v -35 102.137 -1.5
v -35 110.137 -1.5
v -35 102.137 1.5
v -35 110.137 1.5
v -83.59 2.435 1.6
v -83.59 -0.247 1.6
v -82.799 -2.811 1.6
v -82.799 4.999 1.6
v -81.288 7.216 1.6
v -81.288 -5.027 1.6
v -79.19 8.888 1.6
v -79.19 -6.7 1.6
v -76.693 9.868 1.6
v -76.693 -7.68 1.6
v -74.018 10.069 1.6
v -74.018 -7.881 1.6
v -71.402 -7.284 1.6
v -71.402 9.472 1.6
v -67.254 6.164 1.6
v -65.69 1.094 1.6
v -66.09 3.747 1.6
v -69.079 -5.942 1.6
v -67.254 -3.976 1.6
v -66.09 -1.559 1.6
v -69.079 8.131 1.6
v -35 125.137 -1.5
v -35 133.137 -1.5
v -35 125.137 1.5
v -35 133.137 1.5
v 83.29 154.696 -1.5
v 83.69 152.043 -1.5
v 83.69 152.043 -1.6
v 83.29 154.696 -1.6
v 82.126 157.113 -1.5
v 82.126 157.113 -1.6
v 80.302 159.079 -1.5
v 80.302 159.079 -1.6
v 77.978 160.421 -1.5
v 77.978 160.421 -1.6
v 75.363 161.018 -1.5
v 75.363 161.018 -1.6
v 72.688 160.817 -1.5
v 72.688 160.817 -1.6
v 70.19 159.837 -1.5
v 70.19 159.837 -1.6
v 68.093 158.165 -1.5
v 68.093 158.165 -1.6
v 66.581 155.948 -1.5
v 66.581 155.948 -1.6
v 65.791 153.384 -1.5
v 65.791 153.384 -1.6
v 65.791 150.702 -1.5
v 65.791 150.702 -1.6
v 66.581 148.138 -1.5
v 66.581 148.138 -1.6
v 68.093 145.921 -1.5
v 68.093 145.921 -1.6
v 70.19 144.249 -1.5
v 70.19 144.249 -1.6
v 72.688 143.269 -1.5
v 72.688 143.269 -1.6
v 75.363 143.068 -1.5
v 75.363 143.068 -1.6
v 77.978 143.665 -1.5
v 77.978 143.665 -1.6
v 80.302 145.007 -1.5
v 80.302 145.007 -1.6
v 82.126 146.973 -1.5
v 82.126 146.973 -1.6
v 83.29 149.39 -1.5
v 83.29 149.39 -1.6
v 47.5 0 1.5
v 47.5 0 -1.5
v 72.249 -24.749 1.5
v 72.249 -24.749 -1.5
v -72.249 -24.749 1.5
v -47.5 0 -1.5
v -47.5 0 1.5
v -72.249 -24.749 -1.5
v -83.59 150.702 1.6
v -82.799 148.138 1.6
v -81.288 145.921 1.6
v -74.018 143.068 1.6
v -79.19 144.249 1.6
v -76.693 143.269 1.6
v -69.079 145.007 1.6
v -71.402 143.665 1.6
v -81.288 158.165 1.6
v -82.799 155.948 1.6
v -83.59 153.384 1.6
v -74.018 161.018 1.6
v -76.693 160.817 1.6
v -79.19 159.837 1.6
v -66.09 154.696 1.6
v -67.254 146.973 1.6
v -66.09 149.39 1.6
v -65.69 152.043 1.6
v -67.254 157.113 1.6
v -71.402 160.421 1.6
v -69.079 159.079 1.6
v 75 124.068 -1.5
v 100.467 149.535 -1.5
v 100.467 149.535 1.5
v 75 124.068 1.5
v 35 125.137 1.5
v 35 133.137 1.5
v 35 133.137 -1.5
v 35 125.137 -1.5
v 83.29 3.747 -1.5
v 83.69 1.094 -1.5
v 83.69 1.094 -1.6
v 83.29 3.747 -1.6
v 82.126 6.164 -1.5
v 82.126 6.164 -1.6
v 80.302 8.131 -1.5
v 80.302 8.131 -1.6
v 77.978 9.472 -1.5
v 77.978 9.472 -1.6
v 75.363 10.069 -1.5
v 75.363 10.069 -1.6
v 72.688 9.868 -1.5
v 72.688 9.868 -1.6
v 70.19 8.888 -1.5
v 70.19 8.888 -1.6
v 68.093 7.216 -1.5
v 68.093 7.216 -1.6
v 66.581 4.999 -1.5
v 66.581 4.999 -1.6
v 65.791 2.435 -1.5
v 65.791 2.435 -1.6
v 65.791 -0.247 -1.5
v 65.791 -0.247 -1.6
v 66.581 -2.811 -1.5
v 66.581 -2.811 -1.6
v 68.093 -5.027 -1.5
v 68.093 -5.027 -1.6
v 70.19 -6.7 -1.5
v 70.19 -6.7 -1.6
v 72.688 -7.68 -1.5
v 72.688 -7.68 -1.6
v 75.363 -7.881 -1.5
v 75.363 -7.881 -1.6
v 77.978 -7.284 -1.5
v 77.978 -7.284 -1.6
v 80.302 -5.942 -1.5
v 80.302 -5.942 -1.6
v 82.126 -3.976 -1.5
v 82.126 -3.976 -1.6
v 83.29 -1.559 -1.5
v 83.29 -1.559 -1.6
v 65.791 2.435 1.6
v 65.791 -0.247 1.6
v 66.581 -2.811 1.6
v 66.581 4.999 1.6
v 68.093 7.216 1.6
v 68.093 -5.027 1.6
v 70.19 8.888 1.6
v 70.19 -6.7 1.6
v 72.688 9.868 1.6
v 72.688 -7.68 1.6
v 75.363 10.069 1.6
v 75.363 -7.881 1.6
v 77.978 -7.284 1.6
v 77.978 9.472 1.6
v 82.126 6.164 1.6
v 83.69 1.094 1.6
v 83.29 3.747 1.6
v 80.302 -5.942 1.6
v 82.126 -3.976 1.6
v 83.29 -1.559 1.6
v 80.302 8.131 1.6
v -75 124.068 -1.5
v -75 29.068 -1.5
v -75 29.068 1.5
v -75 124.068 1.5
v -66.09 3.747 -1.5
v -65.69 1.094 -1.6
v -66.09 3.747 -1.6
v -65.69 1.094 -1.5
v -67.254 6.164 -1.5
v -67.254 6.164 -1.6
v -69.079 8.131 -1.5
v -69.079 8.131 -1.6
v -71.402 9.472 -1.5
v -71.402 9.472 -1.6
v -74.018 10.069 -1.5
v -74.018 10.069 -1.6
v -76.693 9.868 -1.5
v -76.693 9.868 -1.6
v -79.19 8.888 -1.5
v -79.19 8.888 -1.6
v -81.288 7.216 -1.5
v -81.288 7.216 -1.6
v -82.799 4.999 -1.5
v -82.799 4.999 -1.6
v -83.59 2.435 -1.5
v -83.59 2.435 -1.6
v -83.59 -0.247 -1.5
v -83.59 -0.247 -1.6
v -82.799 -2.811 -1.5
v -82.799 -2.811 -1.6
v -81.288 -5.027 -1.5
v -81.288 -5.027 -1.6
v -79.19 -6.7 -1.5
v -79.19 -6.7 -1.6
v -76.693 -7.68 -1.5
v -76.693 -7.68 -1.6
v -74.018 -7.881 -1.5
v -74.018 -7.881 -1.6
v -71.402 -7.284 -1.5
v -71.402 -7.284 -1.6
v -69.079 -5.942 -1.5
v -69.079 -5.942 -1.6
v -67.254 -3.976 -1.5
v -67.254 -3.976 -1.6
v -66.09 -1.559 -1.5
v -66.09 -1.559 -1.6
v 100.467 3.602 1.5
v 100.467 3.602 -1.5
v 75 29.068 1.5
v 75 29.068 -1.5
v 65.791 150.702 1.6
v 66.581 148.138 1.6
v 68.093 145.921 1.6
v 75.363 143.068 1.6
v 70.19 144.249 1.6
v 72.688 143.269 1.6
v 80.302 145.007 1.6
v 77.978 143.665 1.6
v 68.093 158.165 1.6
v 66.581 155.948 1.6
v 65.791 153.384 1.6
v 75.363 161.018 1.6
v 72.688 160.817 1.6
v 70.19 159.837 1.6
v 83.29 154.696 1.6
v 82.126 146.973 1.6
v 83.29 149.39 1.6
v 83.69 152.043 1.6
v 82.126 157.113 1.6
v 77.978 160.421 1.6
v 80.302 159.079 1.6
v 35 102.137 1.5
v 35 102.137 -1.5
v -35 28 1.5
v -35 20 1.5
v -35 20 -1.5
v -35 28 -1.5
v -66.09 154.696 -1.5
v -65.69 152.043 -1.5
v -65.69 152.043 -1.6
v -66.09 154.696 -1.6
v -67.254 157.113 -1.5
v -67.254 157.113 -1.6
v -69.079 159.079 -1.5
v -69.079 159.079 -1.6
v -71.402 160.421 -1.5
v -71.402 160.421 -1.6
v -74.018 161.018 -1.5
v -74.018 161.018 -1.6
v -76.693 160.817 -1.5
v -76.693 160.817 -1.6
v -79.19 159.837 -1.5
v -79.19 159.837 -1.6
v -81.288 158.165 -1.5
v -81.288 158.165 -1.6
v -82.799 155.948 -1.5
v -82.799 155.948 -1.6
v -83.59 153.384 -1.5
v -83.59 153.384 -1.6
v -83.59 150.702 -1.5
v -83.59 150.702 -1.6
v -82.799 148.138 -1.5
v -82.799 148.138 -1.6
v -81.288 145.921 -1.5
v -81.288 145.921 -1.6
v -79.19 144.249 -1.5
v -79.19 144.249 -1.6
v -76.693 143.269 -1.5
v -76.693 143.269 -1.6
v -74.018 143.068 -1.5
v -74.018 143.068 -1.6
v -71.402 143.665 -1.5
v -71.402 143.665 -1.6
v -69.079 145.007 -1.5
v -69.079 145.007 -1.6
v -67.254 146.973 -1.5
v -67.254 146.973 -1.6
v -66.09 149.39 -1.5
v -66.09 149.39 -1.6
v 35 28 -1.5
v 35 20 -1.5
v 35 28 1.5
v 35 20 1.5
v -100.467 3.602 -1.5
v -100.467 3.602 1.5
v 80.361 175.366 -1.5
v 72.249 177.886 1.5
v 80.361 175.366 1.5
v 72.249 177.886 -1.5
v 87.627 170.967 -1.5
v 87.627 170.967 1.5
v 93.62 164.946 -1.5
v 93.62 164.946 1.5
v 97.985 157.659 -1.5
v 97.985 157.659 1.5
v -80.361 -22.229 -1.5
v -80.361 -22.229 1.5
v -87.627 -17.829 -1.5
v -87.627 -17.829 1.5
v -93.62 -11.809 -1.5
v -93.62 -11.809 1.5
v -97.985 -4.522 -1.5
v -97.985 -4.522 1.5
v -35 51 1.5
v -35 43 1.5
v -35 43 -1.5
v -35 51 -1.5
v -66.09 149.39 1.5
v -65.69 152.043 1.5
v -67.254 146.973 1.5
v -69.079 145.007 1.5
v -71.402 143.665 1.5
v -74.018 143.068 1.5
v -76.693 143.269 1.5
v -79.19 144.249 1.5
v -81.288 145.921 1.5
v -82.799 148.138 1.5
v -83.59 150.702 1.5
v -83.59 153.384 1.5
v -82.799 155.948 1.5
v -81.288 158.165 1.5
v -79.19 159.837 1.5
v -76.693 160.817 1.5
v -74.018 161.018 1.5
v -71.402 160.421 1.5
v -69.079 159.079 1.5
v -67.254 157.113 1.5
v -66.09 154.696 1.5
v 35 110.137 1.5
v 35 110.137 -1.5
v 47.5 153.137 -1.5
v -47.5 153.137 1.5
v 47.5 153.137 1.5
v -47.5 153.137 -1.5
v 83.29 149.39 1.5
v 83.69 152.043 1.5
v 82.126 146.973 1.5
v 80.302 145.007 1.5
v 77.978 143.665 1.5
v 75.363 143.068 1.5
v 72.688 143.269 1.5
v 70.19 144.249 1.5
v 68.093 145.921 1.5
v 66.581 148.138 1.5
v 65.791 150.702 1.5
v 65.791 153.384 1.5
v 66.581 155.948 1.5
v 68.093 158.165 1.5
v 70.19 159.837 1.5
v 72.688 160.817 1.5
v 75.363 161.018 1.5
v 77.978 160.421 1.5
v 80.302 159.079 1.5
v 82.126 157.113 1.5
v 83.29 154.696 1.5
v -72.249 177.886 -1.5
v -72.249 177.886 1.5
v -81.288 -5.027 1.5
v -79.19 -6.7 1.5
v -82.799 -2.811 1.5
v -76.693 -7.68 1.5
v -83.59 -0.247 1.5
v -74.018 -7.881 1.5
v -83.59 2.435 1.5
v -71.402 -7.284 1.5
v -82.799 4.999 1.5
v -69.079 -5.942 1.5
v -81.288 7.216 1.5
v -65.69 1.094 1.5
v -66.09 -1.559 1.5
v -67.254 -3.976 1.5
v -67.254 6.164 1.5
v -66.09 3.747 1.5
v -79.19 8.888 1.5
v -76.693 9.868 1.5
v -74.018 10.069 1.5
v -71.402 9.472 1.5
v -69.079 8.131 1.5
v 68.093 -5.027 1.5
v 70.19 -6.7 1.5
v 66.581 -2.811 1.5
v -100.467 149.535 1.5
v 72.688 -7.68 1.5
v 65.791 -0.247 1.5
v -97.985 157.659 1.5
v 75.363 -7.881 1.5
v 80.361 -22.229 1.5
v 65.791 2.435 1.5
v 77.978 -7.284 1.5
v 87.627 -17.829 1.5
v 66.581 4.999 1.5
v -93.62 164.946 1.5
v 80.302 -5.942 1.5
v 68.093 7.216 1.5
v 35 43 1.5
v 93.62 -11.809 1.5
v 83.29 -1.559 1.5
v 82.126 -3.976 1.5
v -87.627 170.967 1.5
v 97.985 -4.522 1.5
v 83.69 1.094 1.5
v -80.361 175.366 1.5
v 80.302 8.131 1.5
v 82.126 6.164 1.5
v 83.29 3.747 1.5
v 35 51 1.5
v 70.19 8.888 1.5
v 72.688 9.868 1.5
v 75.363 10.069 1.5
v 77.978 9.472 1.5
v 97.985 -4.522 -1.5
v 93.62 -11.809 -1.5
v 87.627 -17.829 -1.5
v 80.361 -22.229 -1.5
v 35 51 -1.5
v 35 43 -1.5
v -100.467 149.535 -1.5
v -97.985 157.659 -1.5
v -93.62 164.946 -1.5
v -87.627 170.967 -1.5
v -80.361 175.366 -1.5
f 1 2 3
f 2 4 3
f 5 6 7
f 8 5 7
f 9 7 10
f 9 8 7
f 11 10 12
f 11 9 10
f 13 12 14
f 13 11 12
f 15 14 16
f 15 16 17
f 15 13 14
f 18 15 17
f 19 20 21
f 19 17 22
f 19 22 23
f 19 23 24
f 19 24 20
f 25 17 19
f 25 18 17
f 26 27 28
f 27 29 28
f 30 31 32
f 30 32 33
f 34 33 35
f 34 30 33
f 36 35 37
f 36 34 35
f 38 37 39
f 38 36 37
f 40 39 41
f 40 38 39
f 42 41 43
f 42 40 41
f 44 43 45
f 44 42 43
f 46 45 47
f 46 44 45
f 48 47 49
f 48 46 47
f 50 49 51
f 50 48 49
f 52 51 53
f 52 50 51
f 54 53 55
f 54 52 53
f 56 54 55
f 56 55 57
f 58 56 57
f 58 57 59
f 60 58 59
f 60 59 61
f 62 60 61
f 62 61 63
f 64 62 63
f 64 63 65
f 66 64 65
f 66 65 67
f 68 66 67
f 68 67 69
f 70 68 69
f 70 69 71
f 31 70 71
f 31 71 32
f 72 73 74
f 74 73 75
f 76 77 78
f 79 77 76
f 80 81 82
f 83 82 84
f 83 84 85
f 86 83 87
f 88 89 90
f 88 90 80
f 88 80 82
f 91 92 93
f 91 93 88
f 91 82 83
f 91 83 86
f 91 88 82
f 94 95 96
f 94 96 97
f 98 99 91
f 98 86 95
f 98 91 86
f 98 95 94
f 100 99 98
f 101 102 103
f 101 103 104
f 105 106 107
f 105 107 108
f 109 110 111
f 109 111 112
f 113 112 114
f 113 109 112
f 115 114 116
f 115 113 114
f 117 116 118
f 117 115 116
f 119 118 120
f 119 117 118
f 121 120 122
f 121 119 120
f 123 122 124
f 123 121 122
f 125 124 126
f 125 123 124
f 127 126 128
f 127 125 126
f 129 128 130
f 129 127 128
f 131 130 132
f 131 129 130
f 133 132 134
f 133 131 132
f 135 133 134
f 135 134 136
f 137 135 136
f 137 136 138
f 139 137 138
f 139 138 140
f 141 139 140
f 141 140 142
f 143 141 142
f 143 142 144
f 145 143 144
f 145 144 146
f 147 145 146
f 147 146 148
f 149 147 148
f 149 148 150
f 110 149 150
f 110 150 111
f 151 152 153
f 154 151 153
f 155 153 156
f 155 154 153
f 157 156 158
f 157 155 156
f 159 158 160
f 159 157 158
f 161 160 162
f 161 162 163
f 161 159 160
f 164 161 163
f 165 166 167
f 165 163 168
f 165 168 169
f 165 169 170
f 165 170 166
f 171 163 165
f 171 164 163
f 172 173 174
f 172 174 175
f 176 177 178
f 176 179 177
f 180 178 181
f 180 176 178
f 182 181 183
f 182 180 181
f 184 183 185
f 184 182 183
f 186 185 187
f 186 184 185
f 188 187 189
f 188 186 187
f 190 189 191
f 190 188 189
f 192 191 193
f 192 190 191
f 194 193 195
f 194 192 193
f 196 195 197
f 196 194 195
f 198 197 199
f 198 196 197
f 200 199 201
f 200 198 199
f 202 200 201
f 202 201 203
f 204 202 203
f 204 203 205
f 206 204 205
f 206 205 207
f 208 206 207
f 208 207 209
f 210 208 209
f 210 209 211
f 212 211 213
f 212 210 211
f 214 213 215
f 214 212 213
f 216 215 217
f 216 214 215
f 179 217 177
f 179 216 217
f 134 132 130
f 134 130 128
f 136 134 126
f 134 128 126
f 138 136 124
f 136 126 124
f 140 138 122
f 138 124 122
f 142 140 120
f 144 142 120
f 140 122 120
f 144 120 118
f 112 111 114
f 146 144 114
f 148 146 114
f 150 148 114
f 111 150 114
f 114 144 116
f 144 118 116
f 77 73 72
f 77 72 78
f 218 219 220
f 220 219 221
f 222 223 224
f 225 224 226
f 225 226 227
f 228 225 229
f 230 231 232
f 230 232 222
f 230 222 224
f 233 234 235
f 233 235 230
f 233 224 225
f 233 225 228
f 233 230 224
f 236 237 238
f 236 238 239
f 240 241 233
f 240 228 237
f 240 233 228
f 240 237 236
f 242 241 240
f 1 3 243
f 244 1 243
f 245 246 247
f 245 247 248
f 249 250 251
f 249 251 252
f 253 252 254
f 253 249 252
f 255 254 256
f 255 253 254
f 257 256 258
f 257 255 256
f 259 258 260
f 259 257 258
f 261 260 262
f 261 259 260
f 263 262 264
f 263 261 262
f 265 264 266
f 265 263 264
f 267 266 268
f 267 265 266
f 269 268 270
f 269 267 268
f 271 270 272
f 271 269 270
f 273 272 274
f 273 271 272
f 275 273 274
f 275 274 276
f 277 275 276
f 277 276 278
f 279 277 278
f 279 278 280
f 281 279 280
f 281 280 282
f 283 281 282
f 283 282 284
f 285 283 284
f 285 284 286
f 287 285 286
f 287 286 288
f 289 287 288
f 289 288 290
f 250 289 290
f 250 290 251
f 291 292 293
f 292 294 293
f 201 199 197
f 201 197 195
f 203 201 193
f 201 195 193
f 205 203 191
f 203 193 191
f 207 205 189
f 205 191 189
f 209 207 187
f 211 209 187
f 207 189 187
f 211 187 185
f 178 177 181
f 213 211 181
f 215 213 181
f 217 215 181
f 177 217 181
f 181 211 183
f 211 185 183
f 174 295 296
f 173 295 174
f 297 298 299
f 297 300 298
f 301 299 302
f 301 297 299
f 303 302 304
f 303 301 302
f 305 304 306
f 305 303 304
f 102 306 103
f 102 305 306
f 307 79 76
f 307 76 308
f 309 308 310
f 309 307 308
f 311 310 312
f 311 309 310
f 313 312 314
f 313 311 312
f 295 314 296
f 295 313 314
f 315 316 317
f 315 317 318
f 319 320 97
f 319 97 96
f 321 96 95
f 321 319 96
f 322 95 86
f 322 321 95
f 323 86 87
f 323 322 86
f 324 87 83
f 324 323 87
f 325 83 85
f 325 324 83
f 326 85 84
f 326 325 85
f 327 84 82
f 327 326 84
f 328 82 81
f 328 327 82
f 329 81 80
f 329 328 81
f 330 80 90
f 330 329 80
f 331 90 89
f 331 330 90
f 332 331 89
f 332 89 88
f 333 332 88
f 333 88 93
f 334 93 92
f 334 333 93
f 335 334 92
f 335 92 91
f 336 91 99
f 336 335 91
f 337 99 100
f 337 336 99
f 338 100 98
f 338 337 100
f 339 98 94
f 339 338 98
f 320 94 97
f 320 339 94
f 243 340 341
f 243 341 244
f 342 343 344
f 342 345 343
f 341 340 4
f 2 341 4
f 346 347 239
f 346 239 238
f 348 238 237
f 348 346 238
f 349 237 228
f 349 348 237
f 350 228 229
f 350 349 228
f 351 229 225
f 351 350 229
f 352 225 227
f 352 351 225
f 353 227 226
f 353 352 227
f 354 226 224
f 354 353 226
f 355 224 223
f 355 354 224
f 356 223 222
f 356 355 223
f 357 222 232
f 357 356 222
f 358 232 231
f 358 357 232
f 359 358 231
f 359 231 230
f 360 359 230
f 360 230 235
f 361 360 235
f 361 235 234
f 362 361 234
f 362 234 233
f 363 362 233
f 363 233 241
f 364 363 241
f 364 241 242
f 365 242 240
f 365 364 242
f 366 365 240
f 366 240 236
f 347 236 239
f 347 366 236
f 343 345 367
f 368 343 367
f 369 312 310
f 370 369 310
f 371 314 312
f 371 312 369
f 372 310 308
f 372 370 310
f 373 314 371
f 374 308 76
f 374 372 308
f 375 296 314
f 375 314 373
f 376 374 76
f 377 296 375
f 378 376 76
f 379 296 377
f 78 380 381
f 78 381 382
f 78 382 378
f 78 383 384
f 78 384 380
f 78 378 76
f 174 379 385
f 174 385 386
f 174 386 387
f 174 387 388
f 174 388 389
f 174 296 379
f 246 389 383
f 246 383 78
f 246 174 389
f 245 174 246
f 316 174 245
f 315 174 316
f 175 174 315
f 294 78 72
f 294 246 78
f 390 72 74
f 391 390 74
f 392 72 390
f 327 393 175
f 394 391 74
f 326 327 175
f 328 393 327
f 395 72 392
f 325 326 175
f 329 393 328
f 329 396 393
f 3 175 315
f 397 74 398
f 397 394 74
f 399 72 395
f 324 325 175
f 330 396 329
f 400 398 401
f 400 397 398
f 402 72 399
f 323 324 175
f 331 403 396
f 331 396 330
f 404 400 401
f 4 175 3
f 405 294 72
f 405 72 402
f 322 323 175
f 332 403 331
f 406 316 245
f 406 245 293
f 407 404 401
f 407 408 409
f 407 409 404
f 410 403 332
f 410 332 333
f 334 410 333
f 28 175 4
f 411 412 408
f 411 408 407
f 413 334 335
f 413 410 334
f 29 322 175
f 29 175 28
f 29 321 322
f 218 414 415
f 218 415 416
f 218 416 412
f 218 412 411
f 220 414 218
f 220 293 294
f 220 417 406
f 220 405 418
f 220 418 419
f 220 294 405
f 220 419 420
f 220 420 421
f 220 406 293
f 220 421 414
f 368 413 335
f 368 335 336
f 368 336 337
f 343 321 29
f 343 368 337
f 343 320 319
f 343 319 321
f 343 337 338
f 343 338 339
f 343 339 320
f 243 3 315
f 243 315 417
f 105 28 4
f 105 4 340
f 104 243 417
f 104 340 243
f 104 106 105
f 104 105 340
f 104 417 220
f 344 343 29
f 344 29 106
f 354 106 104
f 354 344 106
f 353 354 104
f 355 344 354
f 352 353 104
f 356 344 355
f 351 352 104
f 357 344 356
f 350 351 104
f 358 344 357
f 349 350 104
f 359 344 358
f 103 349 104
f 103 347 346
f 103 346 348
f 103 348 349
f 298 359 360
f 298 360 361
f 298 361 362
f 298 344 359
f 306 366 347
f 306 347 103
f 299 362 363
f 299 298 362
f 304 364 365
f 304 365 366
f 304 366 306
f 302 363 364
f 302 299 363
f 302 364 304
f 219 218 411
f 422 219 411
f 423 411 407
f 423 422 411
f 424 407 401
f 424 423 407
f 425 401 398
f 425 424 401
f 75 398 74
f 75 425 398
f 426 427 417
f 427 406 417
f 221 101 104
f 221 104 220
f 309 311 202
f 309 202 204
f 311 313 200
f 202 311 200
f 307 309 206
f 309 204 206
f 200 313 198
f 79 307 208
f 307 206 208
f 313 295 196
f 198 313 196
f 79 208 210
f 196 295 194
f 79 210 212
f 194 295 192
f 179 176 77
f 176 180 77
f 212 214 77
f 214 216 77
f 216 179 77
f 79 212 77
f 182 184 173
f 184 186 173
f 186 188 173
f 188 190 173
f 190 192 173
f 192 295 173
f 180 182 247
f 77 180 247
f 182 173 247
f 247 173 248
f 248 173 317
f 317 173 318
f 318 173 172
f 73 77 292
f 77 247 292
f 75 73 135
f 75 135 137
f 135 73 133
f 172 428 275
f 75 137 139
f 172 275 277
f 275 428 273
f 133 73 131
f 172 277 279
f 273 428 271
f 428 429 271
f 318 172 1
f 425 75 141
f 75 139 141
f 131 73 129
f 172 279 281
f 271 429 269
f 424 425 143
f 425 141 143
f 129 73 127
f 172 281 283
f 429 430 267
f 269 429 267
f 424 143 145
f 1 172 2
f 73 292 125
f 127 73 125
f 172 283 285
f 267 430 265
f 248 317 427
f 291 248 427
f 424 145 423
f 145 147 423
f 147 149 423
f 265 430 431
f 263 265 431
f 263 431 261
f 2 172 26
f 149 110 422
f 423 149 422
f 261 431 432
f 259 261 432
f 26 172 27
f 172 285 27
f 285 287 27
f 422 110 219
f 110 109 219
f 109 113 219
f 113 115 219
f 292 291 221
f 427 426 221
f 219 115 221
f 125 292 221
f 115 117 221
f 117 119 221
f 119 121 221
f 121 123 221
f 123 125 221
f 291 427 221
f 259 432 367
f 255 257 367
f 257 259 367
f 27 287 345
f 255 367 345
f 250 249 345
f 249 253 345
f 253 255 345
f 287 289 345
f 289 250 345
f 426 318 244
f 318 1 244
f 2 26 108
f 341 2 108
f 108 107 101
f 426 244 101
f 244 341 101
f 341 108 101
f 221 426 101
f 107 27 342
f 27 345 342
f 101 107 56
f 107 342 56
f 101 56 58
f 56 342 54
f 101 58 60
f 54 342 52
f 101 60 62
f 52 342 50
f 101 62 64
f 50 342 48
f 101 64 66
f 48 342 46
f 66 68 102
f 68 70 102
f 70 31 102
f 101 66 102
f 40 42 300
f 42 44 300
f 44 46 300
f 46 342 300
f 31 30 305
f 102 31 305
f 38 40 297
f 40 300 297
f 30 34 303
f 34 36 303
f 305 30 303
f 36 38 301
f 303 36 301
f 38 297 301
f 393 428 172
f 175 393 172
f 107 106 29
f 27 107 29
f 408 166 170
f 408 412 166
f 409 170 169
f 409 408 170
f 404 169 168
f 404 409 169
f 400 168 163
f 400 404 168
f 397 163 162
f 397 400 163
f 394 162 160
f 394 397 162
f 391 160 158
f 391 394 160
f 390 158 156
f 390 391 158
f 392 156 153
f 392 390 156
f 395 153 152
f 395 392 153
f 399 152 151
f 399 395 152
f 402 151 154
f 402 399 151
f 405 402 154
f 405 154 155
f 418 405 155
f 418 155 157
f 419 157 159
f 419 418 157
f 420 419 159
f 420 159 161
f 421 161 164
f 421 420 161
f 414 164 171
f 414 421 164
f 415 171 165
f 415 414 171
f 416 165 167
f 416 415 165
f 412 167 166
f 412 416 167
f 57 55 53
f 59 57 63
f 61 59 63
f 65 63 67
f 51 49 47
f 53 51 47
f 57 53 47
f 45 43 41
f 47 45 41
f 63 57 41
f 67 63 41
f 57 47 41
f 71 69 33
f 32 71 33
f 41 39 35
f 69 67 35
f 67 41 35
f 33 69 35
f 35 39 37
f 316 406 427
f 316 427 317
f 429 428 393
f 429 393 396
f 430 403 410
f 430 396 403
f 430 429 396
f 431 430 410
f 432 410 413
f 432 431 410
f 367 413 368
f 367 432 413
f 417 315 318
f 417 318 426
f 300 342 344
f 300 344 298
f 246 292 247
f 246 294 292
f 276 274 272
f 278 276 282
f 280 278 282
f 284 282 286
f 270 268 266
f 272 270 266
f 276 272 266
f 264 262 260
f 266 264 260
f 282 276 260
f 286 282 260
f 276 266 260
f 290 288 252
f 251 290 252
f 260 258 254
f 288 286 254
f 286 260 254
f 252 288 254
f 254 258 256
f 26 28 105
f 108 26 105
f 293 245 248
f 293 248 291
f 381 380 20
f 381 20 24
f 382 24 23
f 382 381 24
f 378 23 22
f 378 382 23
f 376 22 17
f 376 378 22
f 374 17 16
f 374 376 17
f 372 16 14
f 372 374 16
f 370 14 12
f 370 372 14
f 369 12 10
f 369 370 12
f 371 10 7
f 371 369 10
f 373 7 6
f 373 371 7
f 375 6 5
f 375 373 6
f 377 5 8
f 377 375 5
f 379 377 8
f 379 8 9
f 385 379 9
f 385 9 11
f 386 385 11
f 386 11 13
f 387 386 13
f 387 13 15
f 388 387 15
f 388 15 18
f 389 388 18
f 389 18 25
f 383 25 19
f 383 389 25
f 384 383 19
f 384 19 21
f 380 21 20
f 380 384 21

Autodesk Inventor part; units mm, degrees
ref_plane "YZ Plane" through (0, 0, 0) normal (1, 0, 0) x (0, 1, 0)
ref_plane "XZ Plane" through (0, 0, 0) normal (0, 1, 0) x (-1, 0, 0)
ref_plane "XY Plane" through (0, 0, 0) normal (0, 0, 1) x (1, 0, 0)
sketch "Sketch1" plane through (0, 0, 0) normal (0, 0, 1) x (1, 0, 0)
  line L0 (0, 0) -> (-47.5, 0)
  line L1 (-47.5, 0) -> (-72.2487, -24.7487)
  line L2 (-100.4666, 3.6019) -> (-75, 29.0685)
  line L3 (-75, 29.0685) -> (-75, 76.5685)
  line L4 (0, -71.4752) -> (0, 224.6123) projected
  arc A0 (-100.4666, 3.6019) -> (-72.2487, -24.7487) centre (-66, 9.6889) ccw
  line L5 (-75, 76.5685) -> (0, 76.5685)
  line L6 (0, 153.1371) -> (-47.5, 153.1371)
  line L7 (-47.5, 153.1371) -> (-72.2487, 177.8858)
  line L8 (-100.4666, 149.5352) -> (-75, 124.0685)
  line L9 (-75, 124.0685) -> (-75, 76.5685)
  arc A1 (-72.2487, 177.8858) -> (-100.4666, 149.5352) centre (-66, 143.4481) ccw
  line L10 (0, 0) -> (47.5, 0)
  line L11 (47.5, 0) -> (72.2487, -24.7487)
  line L12 (100.4666, 3.6019) -> (75, 29.0685)
  line L13 (75, 29.0685) -> (75, 76.5685)
  arc A2 (72.2487, -24.7487) -> (100.4666, 3.6019) centre (66, 9.6889) ccw
  line L14 (75, 124.0685) -> (75, 76.5685)
  line L15 (100.4666, 149.5352) -> (75, 124.0685)
  arc A3 (100.4666, 149.5352) -> (72.2487, 177.8858) centre (66, 143.4481) ccw
  line L16 (47.5, 153.1371) -> (72.2487, 177.8858)
  line L17 (0, 153.1371) -> (47.5, 153.1371)
  line L18 (-100.4666, 3.6019) -> (-72.2487, -24.7487)
  line L19 (-75, 29.0685) -> (-47.5, 0)
  circle A4 centre (-74.6902, 1.0941) radius 9
  circle A5 centre (-74.6902, 152.043) radius 9
  circle A6 centre (74.6902, 1.0941) radius 9
  circle A7 centre (74.6902, 152.043) radius 9
  dimension "d0" = 135
  dimension "d1" = 47.5
  dimension "d2" = 35
  dimension "d3" = 40
  dimension "d4" = 75
  dimension "d5" = 35
  dimension "d6" = 66
  dimension "d11" = 20
  dimension "d12" = 38
  dimension "d13" = 18
extrude "Extrusion1" add sketch "Sketch1" along normal blind 1.5 and the other way blind 1.5 contours L0 L19 L3 L5 L4 | L4 L17 L16 A3 L15 L14 L13 L12 A2 L11 L10 | L1 L18 L2 L19 | L5 L9 L8 A1 L7 L6 L4 | A0 L18 | A4 | A5 | A6 | A7
extrude "Extrusion2" add sketch "Sketch1" along normal mid plane 3.2 contours A4 | A5 | A6 | A7
sketch "Sketch2" plane through (0, 0, 1.5) normal (0, 0, 1) x (1, 0, 0)
  point P0 (0, 0)
sketch "Sketch3" plane through (0, 0, 1.5) normal (0, 0, 1) x (1, 0, 0)
  line L0 (0, 20) -> (-35, 20)
  line L1 (-35, 20) -> (-35, 28)
  line L2 (-35, 28) -> (0, 28)
  line L3 (0, 43) -> (-35, 43)
  line L4 (-35, 43) -> (-35, 51)
  line L5 (-35, 51) -> (0, 51)
  line L6 (0, 0) -> (0, 150)
  line L7 (-75, 124.0685) -> (-75, 29.0685) projected
  line L8 (-75, 76.5685) -> (75, 76.5685)
  line L9 (75, 124.0685) -> (75, 29.0685) projected
  line L10 (0, 133.1371) -> (-35, 133.1371)
  line L11 (-35, 133.1371) -> (-35, 125.1371)
  line L12 (-35, 125.1371) -> (0, 125.1371)
  line L13 (0, 110.1371) -> (-35, 110.1371)
  line L14 (-35, 110.1371) -> (-35, 102.1371)
  line L15 (-35, 102.1371) -> (0, 102.1371)
  line L16 (0, 20) -> (35, 20)
  line L17 (35, 20) -> (35, 28)
  line L18 (35, 28) -> (0, 28)
  line L19 (0, 43) -> (35, 43)
  line L20 (35, 43) -> (35, 51)
  line L21 (35, 51) -> (0, 51)
  line L22 (35, 102.1371) -> (0, 102.1371)
  line L23 (0, 110.1371) -> (35, 110.1371)
  line L24 (35, 110.1371) -> (35, 102.1371)
  line L25 (35, 125.1371) -> (0, 125.1371)
  line L26 (35, 133.1371) -> (35, 125.1371)
  line L27 (0, 133.1371) -> (35, 133.1371)
  dimension "d21" = 35
  dimension "d22" = 8
  dimension "d23" = 150
  dimension "d24" = 15
  dimension "d25" = 20
extrude "Extrusion3" cut sketch "Sketch3" against normal blind 10
properties part number "Superior_Base"
